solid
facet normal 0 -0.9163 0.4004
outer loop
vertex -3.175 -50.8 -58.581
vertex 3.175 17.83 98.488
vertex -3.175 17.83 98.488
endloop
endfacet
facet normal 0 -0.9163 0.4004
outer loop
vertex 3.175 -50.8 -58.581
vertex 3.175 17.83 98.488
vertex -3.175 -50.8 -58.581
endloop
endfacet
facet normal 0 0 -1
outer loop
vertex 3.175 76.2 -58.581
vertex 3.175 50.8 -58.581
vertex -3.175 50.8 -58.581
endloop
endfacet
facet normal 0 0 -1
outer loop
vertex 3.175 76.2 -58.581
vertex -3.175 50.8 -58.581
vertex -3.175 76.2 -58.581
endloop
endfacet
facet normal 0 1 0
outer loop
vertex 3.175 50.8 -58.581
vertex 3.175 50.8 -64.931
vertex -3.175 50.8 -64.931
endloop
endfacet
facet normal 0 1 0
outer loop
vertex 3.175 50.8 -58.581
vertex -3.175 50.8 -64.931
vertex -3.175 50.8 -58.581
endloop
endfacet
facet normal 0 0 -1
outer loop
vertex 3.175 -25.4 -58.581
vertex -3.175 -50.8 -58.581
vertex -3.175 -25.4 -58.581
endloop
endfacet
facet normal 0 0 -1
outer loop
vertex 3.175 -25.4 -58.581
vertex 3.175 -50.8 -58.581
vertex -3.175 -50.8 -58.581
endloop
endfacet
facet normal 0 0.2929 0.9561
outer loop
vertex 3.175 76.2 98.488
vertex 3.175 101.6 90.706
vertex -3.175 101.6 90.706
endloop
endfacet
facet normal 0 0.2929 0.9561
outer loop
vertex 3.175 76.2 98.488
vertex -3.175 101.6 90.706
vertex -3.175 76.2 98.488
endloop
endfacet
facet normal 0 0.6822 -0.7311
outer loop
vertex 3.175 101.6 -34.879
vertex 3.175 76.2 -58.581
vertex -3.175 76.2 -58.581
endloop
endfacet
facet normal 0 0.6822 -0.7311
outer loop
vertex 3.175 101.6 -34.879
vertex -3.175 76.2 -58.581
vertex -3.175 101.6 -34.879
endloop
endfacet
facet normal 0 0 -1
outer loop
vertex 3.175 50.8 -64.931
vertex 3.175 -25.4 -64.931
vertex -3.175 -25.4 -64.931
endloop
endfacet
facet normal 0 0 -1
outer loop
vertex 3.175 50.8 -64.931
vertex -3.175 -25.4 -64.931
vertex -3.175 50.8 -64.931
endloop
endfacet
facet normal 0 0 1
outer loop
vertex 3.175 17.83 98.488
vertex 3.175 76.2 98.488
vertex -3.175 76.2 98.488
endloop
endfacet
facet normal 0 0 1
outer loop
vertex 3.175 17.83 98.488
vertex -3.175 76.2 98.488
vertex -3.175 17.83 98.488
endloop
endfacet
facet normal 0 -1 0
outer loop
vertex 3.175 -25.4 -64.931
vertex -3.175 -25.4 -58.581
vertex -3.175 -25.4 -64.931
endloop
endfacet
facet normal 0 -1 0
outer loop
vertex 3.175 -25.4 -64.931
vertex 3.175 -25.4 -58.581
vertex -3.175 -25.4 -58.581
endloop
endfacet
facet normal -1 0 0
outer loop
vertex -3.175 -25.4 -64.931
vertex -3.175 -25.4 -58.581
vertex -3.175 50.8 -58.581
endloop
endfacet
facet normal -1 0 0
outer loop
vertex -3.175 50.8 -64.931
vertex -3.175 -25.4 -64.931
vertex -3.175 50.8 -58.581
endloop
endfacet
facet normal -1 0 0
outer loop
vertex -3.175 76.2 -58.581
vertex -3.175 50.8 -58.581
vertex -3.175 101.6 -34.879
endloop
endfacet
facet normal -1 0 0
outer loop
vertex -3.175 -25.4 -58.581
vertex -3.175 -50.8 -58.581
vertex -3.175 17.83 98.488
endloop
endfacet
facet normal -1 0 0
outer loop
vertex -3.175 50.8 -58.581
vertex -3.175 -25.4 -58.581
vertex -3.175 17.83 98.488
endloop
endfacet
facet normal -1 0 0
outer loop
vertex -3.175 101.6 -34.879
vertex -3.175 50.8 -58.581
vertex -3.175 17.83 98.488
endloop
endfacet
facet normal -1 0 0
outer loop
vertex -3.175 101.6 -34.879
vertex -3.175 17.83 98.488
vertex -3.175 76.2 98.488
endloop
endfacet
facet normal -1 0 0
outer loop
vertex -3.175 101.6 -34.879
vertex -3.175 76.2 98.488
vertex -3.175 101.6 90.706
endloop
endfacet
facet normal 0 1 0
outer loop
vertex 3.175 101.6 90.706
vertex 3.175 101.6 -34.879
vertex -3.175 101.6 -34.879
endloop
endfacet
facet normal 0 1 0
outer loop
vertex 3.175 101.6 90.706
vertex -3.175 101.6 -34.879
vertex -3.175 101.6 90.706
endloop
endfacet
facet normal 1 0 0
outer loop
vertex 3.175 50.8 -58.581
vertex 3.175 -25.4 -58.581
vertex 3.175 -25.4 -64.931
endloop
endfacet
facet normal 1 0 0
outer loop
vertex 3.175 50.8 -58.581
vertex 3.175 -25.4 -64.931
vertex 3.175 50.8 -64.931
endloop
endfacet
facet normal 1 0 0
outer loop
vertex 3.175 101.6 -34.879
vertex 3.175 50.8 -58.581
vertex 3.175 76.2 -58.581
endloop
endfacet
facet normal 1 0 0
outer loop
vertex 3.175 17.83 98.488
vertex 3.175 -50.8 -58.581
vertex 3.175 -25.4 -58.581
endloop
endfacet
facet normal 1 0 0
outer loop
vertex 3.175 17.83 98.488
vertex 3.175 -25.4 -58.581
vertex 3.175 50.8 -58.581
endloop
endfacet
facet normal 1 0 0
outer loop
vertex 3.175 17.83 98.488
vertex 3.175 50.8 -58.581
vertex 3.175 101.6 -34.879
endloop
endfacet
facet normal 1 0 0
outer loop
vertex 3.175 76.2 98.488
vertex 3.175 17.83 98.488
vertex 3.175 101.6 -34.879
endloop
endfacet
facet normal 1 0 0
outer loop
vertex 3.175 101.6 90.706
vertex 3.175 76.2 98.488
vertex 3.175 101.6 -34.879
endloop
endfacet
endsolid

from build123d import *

# Parameters (mm, degrees)
F1_DEPTH = 3.175


with BuildPart() as f1:
    # F0 (on Right) → F1 (new body, symmetric)
    with BuildSketch(Plane.YZ):
        Polygon((50.8, -58.581289), (0, -58.581289), (-25.4, -58.581289), (-25.4, -64.931289), (50.8, -64.931289), align=None)
        Polygon((-25.4, -58.581289), (0, -58.581289), (50.8, -58.581289), (76.2, -58.581289), (101.6, -34.879341), (101.6, 90.705617), (76.2, 98.488349), (17.829527, 98.488349), (-50.8, -58.581289), align=None)
    extrude(amount=F1_DEPTH, both=True)


solid = f1.part
